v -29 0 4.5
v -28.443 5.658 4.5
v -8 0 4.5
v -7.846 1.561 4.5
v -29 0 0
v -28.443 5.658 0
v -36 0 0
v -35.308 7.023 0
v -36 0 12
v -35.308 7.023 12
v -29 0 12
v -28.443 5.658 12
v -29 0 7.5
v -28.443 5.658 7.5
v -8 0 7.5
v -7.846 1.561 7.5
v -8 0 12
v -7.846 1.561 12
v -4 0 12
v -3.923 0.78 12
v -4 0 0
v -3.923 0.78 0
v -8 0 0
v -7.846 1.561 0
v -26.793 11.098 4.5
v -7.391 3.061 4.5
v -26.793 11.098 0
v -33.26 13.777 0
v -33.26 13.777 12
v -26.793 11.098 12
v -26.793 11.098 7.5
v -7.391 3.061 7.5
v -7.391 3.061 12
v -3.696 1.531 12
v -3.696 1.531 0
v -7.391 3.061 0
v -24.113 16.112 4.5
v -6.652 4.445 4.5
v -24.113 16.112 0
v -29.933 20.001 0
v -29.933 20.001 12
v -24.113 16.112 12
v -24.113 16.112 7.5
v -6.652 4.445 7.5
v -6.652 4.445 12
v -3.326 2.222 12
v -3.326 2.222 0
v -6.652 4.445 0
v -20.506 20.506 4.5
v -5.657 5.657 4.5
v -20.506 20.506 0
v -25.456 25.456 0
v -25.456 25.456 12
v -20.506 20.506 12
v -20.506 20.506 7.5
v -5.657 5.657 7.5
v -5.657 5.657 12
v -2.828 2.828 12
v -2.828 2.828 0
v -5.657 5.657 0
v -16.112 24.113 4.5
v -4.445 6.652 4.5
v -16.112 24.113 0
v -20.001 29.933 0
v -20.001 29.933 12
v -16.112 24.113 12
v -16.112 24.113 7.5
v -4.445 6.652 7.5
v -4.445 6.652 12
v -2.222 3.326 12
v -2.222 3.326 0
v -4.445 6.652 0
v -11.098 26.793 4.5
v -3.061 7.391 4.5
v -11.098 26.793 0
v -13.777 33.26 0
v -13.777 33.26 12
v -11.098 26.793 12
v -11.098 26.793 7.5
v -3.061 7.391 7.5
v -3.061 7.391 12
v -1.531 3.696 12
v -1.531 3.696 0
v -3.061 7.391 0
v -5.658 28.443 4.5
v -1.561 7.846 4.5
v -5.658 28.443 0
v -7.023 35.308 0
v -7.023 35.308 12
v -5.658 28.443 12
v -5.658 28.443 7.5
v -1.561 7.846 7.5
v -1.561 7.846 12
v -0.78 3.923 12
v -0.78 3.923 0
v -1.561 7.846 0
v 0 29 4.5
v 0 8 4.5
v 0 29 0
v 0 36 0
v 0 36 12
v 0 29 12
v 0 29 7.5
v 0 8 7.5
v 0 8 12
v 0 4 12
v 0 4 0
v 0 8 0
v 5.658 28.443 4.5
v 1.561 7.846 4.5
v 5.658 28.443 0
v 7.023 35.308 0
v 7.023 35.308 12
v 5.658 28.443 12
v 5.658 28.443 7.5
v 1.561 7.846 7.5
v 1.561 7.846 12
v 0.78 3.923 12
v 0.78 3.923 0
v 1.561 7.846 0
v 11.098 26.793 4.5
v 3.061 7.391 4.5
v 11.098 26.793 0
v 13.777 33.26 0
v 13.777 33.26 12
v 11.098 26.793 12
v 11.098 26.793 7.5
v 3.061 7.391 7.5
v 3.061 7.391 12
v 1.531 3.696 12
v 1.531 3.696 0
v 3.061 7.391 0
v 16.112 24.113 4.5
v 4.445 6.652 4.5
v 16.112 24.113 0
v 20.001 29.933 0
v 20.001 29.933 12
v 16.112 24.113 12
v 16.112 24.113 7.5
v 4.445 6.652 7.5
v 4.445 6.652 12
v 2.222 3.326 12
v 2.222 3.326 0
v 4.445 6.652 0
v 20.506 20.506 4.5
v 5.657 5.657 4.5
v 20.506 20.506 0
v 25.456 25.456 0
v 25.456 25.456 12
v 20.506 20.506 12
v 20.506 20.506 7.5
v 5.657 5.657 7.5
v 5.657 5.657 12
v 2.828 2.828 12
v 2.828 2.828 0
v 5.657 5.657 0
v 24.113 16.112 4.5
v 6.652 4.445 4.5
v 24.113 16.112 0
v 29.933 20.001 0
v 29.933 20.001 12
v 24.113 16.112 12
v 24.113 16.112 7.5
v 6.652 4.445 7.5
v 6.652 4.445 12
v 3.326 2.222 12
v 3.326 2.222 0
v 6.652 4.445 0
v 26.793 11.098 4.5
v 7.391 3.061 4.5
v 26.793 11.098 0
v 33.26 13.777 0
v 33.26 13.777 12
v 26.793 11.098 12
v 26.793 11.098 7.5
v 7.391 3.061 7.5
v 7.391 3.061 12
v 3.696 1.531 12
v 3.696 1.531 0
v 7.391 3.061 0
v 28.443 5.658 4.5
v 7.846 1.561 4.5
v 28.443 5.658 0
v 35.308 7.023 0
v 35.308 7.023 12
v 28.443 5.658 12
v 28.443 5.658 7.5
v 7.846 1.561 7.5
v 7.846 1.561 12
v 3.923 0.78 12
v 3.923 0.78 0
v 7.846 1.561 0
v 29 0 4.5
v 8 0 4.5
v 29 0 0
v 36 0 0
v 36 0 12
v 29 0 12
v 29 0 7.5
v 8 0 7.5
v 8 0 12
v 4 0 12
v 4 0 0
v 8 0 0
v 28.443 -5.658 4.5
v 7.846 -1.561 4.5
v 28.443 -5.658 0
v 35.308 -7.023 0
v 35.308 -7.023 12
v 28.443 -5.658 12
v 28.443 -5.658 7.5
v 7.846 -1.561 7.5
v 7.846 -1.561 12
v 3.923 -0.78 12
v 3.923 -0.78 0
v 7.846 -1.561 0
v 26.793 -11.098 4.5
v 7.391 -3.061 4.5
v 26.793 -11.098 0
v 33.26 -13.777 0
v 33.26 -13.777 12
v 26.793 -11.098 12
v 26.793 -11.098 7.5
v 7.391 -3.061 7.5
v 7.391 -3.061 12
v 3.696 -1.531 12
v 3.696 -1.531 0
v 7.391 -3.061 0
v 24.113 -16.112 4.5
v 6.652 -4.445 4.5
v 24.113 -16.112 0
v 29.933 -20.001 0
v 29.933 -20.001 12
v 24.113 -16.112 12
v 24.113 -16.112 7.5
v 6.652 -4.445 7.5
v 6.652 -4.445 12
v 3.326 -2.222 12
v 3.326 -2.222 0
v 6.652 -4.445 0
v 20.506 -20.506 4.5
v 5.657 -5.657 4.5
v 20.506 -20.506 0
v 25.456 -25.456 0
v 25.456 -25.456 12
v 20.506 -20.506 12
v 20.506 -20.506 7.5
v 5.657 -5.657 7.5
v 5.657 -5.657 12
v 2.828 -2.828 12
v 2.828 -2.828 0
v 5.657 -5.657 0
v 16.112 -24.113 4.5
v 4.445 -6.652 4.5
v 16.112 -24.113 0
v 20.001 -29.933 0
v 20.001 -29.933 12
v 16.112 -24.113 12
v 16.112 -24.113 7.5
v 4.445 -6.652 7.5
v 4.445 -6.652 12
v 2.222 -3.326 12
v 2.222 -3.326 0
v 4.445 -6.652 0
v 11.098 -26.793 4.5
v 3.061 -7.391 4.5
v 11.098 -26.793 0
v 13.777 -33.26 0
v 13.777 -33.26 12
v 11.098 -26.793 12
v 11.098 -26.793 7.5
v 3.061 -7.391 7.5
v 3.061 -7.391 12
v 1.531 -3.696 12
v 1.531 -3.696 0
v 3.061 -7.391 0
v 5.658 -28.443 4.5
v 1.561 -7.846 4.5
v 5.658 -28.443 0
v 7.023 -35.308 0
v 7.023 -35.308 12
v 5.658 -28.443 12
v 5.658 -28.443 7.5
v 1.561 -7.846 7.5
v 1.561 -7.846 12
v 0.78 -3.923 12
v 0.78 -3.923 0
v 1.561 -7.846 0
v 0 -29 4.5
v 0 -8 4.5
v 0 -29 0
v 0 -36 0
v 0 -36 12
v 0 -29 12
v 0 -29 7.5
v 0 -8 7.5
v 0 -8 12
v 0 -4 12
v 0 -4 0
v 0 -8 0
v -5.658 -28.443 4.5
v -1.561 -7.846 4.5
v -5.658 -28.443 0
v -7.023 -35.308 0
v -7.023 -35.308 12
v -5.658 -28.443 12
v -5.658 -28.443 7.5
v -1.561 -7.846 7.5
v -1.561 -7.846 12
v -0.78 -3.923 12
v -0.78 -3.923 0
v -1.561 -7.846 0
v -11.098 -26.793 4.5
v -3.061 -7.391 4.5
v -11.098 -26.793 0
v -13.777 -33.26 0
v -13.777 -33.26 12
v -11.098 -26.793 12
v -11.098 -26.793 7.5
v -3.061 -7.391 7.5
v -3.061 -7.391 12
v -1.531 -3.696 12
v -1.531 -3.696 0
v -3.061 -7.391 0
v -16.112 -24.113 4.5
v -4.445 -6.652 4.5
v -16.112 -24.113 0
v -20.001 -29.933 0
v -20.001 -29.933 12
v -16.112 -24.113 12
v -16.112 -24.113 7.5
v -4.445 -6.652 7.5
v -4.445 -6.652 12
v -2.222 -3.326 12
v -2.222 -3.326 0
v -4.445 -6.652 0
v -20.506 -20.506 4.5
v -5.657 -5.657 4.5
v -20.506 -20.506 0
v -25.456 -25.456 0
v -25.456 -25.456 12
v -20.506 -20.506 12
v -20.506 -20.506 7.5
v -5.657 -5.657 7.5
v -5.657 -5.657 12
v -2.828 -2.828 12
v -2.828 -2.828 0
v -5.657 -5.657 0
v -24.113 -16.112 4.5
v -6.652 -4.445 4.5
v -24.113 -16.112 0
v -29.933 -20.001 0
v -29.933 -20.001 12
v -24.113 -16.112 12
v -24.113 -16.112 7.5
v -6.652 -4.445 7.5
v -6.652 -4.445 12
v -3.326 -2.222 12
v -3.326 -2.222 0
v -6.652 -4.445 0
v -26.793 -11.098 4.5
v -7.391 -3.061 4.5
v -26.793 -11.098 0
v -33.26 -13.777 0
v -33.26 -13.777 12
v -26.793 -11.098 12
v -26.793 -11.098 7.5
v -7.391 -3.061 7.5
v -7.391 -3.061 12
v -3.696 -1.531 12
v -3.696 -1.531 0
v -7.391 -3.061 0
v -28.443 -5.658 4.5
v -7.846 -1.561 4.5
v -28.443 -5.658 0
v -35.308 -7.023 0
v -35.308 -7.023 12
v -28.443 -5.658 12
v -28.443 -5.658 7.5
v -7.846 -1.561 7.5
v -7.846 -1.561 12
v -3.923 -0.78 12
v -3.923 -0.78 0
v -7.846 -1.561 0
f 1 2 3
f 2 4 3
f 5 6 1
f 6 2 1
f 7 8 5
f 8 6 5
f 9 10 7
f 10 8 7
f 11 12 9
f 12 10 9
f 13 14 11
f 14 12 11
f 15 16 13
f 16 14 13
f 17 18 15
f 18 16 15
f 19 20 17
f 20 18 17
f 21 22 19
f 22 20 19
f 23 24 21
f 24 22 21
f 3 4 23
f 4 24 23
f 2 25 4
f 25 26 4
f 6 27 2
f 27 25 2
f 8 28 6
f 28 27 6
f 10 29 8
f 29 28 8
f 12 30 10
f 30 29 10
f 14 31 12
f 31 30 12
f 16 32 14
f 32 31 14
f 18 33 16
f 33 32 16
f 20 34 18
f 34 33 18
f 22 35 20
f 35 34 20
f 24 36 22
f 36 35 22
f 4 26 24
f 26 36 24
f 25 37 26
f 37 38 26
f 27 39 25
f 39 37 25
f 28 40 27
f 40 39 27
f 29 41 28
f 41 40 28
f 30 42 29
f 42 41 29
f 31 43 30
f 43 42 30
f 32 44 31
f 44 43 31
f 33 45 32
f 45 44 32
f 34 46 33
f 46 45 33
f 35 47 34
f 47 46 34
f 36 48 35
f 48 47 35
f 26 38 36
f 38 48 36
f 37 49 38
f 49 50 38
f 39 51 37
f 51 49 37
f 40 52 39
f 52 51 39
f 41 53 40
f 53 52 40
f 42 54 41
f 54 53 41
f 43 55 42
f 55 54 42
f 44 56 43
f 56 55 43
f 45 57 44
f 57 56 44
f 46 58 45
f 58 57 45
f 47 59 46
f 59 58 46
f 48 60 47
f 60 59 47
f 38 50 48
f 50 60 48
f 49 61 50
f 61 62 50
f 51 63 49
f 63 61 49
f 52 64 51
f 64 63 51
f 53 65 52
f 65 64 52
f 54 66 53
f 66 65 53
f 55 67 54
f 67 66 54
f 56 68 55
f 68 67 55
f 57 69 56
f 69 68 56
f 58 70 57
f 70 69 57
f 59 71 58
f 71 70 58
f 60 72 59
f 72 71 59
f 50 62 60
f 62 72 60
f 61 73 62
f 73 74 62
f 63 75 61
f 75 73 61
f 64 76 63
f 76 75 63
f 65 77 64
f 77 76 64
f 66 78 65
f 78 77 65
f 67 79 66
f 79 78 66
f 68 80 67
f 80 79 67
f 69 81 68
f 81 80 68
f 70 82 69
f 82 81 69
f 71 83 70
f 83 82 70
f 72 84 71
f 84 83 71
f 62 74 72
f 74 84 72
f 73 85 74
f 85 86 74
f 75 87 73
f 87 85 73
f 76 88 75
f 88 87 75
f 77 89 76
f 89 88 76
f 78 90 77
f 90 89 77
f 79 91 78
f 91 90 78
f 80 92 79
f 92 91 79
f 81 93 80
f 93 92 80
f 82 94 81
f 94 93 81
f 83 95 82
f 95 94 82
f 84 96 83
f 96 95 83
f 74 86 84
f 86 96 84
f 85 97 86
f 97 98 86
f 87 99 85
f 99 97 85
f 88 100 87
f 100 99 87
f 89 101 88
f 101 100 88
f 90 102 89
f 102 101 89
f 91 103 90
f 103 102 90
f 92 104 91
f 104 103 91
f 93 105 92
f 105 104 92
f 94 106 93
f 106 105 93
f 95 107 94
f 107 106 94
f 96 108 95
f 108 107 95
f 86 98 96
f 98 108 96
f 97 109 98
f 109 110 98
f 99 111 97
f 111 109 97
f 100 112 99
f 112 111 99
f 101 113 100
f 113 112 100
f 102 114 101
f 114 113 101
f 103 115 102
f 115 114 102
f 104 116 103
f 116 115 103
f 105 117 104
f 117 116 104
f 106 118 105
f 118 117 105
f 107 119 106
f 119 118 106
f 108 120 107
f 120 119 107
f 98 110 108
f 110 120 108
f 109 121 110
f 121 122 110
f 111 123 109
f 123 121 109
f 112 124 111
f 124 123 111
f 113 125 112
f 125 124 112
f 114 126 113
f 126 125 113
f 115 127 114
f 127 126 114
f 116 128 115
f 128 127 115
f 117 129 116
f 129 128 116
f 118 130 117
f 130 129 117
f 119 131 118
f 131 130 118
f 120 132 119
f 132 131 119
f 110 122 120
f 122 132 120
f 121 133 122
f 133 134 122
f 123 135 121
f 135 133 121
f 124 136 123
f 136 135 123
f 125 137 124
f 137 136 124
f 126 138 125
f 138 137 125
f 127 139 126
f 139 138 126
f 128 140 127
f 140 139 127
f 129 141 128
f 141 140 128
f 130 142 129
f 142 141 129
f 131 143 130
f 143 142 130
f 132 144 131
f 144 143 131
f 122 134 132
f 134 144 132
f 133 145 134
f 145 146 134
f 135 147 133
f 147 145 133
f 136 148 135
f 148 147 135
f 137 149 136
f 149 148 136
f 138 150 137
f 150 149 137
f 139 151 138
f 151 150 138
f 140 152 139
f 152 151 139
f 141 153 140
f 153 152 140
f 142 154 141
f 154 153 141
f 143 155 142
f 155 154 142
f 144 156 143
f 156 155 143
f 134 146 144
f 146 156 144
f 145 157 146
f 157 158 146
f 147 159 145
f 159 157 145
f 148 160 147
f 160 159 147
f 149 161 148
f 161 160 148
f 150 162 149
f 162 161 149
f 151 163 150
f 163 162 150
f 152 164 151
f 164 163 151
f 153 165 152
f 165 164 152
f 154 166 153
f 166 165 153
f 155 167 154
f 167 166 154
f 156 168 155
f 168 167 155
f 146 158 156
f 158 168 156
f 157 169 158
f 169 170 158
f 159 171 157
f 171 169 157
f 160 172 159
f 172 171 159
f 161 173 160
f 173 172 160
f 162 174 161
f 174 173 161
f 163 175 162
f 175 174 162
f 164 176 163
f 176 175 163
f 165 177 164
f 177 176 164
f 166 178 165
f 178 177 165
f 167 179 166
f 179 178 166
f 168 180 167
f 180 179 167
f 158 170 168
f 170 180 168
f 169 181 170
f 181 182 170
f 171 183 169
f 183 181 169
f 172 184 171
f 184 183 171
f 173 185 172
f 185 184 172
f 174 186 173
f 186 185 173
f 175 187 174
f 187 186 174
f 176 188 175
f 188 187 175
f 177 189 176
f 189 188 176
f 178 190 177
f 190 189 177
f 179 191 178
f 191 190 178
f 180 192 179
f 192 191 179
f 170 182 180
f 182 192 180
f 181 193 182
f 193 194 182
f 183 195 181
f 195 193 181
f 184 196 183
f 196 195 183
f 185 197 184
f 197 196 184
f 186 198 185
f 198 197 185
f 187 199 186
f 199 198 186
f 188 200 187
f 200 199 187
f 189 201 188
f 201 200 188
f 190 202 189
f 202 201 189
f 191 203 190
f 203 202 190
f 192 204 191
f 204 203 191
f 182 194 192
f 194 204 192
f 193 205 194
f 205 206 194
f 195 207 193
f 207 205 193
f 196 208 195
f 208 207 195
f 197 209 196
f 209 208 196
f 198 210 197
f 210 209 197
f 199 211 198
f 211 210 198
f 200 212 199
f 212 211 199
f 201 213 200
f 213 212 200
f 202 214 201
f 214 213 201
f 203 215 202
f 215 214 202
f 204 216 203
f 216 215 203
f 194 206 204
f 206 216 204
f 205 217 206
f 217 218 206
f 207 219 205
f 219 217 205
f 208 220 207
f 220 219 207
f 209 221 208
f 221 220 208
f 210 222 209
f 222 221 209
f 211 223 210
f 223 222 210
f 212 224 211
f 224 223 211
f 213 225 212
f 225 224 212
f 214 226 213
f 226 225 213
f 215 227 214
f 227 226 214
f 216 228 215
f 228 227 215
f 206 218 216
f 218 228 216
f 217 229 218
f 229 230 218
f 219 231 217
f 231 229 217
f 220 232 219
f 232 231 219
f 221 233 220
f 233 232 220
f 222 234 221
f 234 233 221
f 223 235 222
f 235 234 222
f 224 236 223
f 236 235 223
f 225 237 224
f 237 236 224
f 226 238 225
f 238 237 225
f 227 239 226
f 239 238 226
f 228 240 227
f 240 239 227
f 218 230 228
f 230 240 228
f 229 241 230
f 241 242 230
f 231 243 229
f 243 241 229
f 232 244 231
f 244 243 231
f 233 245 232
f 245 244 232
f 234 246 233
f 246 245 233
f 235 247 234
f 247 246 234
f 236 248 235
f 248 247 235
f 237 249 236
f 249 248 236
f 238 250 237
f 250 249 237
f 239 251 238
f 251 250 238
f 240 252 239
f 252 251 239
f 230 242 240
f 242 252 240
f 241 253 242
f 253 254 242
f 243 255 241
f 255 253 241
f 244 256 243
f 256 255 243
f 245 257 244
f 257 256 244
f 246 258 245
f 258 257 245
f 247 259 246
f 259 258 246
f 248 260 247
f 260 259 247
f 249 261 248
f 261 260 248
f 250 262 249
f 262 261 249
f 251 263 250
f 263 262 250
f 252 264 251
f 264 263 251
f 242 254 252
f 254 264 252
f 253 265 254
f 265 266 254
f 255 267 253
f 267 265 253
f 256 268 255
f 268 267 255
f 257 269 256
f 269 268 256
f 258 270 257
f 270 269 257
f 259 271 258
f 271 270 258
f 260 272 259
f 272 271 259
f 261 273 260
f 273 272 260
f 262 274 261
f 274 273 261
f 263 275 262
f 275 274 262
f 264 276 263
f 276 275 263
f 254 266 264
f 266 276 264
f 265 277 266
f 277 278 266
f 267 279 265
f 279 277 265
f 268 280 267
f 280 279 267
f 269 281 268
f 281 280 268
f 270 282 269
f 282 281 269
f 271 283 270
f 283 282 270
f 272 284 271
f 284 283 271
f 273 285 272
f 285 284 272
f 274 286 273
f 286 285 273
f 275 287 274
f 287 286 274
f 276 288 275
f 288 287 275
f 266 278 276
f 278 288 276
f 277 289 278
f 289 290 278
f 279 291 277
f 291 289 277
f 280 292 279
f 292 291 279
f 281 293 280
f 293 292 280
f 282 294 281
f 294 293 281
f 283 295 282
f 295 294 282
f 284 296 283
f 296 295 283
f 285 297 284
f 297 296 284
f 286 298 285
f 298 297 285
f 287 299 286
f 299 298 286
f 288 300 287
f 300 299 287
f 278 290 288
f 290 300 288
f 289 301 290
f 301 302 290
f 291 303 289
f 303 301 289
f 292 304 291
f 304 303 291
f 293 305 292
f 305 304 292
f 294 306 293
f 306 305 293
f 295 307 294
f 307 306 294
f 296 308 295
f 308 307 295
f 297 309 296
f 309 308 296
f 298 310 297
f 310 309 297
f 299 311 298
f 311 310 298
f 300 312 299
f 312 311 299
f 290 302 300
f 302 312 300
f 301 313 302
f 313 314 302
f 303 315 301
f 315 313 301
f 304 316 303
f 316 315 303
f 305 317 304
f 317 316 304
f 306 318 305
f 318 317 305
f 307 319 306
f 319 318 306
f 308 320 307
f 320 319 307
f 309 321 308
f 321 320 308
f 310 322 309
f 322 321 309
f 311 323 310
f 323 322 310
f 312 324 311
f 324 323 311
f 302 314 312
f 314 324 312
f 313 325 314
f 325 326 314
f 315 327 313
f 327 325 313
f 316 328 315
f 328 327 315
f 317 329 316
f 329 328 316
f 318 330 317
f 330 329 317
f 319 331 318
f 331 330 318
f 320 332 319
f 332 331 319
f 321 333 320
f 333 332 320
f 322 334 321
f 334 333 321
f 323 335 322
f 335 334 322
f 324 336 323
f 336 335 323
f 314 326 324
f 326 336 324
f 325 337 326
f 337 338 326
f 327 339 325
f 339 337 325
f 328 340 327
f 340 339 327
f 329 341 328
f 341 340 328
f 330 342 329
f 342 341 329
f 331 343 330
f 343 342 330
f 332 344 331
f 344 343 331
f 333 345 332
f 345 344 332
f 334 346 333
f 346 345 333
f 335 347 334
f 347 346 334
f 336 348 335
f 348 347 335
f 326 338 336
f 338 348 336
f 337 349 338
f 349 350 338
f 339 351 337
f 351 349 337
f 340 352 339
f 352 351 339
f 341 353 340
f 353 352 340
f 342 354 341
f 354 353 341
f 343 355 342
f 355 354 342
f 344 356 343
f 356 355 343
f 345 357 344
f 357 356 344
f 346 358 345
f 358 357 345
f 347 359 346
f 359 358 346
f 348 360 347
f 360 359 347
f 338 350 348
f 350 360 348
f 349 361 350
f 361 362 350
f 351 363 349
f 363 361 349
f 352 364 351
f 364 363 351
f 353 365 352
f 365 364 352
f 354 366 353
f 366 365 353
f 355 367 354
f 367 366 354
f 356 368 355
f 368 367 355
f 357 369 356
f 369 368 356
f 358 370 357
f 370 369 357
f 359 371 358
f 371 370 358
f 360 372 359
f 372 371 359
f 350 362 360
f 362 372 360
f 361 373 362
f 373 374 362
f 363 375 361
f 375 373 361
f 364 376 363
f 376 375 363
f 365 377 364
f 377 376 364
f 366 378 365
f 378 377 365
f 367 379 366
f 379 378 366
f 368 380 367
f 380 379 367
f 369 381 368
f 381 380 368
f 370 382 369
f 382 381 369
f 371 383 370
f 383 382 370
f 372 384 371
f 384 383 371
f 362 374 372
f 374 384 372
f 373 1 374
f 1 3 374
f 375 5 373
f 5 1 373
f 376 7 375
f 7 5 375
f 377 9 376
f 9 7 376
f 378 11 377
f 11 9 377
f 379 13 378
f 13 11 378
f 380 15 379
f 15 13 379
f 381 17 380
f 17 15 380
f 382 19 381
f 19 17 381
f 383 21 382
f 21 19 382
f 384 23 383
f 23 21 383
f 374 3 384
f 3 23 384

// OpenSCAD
$fn = 32;

// ----------------------------------------------------------------------
// Revolved part: handwheel R36
// ----------------------------------------------------------------------

// --- parameters (mm) ---
bore_r = 4;               // bore radius
rim_r = 36;               // rim radius
rim_w = 7;                // rim axial width
rim_t = 12;               // rim diameter height
hub_r = 8;                // hub radius
web_t = 3;                // web thickness
revolve_angle = 360;      // revolve sweep, degrees

bore_d = 2 * bore_r;
rim_d = 2 * rim_r;
hub_d = 2 * hub_r;

profile = [[4, 0], [8, 0], [8, 4.5], [29, 4.5], [29, 0], [36, 0], [36, 12], [29, 12], [29, 7.5], [8, 7.5], [8, 12], [4, 12]];  // primary outline, 12 points, counter clockwise

// --- the one profile operation ---
rotate_extrude(angle = revolve_angle) polygon(points = profile);
